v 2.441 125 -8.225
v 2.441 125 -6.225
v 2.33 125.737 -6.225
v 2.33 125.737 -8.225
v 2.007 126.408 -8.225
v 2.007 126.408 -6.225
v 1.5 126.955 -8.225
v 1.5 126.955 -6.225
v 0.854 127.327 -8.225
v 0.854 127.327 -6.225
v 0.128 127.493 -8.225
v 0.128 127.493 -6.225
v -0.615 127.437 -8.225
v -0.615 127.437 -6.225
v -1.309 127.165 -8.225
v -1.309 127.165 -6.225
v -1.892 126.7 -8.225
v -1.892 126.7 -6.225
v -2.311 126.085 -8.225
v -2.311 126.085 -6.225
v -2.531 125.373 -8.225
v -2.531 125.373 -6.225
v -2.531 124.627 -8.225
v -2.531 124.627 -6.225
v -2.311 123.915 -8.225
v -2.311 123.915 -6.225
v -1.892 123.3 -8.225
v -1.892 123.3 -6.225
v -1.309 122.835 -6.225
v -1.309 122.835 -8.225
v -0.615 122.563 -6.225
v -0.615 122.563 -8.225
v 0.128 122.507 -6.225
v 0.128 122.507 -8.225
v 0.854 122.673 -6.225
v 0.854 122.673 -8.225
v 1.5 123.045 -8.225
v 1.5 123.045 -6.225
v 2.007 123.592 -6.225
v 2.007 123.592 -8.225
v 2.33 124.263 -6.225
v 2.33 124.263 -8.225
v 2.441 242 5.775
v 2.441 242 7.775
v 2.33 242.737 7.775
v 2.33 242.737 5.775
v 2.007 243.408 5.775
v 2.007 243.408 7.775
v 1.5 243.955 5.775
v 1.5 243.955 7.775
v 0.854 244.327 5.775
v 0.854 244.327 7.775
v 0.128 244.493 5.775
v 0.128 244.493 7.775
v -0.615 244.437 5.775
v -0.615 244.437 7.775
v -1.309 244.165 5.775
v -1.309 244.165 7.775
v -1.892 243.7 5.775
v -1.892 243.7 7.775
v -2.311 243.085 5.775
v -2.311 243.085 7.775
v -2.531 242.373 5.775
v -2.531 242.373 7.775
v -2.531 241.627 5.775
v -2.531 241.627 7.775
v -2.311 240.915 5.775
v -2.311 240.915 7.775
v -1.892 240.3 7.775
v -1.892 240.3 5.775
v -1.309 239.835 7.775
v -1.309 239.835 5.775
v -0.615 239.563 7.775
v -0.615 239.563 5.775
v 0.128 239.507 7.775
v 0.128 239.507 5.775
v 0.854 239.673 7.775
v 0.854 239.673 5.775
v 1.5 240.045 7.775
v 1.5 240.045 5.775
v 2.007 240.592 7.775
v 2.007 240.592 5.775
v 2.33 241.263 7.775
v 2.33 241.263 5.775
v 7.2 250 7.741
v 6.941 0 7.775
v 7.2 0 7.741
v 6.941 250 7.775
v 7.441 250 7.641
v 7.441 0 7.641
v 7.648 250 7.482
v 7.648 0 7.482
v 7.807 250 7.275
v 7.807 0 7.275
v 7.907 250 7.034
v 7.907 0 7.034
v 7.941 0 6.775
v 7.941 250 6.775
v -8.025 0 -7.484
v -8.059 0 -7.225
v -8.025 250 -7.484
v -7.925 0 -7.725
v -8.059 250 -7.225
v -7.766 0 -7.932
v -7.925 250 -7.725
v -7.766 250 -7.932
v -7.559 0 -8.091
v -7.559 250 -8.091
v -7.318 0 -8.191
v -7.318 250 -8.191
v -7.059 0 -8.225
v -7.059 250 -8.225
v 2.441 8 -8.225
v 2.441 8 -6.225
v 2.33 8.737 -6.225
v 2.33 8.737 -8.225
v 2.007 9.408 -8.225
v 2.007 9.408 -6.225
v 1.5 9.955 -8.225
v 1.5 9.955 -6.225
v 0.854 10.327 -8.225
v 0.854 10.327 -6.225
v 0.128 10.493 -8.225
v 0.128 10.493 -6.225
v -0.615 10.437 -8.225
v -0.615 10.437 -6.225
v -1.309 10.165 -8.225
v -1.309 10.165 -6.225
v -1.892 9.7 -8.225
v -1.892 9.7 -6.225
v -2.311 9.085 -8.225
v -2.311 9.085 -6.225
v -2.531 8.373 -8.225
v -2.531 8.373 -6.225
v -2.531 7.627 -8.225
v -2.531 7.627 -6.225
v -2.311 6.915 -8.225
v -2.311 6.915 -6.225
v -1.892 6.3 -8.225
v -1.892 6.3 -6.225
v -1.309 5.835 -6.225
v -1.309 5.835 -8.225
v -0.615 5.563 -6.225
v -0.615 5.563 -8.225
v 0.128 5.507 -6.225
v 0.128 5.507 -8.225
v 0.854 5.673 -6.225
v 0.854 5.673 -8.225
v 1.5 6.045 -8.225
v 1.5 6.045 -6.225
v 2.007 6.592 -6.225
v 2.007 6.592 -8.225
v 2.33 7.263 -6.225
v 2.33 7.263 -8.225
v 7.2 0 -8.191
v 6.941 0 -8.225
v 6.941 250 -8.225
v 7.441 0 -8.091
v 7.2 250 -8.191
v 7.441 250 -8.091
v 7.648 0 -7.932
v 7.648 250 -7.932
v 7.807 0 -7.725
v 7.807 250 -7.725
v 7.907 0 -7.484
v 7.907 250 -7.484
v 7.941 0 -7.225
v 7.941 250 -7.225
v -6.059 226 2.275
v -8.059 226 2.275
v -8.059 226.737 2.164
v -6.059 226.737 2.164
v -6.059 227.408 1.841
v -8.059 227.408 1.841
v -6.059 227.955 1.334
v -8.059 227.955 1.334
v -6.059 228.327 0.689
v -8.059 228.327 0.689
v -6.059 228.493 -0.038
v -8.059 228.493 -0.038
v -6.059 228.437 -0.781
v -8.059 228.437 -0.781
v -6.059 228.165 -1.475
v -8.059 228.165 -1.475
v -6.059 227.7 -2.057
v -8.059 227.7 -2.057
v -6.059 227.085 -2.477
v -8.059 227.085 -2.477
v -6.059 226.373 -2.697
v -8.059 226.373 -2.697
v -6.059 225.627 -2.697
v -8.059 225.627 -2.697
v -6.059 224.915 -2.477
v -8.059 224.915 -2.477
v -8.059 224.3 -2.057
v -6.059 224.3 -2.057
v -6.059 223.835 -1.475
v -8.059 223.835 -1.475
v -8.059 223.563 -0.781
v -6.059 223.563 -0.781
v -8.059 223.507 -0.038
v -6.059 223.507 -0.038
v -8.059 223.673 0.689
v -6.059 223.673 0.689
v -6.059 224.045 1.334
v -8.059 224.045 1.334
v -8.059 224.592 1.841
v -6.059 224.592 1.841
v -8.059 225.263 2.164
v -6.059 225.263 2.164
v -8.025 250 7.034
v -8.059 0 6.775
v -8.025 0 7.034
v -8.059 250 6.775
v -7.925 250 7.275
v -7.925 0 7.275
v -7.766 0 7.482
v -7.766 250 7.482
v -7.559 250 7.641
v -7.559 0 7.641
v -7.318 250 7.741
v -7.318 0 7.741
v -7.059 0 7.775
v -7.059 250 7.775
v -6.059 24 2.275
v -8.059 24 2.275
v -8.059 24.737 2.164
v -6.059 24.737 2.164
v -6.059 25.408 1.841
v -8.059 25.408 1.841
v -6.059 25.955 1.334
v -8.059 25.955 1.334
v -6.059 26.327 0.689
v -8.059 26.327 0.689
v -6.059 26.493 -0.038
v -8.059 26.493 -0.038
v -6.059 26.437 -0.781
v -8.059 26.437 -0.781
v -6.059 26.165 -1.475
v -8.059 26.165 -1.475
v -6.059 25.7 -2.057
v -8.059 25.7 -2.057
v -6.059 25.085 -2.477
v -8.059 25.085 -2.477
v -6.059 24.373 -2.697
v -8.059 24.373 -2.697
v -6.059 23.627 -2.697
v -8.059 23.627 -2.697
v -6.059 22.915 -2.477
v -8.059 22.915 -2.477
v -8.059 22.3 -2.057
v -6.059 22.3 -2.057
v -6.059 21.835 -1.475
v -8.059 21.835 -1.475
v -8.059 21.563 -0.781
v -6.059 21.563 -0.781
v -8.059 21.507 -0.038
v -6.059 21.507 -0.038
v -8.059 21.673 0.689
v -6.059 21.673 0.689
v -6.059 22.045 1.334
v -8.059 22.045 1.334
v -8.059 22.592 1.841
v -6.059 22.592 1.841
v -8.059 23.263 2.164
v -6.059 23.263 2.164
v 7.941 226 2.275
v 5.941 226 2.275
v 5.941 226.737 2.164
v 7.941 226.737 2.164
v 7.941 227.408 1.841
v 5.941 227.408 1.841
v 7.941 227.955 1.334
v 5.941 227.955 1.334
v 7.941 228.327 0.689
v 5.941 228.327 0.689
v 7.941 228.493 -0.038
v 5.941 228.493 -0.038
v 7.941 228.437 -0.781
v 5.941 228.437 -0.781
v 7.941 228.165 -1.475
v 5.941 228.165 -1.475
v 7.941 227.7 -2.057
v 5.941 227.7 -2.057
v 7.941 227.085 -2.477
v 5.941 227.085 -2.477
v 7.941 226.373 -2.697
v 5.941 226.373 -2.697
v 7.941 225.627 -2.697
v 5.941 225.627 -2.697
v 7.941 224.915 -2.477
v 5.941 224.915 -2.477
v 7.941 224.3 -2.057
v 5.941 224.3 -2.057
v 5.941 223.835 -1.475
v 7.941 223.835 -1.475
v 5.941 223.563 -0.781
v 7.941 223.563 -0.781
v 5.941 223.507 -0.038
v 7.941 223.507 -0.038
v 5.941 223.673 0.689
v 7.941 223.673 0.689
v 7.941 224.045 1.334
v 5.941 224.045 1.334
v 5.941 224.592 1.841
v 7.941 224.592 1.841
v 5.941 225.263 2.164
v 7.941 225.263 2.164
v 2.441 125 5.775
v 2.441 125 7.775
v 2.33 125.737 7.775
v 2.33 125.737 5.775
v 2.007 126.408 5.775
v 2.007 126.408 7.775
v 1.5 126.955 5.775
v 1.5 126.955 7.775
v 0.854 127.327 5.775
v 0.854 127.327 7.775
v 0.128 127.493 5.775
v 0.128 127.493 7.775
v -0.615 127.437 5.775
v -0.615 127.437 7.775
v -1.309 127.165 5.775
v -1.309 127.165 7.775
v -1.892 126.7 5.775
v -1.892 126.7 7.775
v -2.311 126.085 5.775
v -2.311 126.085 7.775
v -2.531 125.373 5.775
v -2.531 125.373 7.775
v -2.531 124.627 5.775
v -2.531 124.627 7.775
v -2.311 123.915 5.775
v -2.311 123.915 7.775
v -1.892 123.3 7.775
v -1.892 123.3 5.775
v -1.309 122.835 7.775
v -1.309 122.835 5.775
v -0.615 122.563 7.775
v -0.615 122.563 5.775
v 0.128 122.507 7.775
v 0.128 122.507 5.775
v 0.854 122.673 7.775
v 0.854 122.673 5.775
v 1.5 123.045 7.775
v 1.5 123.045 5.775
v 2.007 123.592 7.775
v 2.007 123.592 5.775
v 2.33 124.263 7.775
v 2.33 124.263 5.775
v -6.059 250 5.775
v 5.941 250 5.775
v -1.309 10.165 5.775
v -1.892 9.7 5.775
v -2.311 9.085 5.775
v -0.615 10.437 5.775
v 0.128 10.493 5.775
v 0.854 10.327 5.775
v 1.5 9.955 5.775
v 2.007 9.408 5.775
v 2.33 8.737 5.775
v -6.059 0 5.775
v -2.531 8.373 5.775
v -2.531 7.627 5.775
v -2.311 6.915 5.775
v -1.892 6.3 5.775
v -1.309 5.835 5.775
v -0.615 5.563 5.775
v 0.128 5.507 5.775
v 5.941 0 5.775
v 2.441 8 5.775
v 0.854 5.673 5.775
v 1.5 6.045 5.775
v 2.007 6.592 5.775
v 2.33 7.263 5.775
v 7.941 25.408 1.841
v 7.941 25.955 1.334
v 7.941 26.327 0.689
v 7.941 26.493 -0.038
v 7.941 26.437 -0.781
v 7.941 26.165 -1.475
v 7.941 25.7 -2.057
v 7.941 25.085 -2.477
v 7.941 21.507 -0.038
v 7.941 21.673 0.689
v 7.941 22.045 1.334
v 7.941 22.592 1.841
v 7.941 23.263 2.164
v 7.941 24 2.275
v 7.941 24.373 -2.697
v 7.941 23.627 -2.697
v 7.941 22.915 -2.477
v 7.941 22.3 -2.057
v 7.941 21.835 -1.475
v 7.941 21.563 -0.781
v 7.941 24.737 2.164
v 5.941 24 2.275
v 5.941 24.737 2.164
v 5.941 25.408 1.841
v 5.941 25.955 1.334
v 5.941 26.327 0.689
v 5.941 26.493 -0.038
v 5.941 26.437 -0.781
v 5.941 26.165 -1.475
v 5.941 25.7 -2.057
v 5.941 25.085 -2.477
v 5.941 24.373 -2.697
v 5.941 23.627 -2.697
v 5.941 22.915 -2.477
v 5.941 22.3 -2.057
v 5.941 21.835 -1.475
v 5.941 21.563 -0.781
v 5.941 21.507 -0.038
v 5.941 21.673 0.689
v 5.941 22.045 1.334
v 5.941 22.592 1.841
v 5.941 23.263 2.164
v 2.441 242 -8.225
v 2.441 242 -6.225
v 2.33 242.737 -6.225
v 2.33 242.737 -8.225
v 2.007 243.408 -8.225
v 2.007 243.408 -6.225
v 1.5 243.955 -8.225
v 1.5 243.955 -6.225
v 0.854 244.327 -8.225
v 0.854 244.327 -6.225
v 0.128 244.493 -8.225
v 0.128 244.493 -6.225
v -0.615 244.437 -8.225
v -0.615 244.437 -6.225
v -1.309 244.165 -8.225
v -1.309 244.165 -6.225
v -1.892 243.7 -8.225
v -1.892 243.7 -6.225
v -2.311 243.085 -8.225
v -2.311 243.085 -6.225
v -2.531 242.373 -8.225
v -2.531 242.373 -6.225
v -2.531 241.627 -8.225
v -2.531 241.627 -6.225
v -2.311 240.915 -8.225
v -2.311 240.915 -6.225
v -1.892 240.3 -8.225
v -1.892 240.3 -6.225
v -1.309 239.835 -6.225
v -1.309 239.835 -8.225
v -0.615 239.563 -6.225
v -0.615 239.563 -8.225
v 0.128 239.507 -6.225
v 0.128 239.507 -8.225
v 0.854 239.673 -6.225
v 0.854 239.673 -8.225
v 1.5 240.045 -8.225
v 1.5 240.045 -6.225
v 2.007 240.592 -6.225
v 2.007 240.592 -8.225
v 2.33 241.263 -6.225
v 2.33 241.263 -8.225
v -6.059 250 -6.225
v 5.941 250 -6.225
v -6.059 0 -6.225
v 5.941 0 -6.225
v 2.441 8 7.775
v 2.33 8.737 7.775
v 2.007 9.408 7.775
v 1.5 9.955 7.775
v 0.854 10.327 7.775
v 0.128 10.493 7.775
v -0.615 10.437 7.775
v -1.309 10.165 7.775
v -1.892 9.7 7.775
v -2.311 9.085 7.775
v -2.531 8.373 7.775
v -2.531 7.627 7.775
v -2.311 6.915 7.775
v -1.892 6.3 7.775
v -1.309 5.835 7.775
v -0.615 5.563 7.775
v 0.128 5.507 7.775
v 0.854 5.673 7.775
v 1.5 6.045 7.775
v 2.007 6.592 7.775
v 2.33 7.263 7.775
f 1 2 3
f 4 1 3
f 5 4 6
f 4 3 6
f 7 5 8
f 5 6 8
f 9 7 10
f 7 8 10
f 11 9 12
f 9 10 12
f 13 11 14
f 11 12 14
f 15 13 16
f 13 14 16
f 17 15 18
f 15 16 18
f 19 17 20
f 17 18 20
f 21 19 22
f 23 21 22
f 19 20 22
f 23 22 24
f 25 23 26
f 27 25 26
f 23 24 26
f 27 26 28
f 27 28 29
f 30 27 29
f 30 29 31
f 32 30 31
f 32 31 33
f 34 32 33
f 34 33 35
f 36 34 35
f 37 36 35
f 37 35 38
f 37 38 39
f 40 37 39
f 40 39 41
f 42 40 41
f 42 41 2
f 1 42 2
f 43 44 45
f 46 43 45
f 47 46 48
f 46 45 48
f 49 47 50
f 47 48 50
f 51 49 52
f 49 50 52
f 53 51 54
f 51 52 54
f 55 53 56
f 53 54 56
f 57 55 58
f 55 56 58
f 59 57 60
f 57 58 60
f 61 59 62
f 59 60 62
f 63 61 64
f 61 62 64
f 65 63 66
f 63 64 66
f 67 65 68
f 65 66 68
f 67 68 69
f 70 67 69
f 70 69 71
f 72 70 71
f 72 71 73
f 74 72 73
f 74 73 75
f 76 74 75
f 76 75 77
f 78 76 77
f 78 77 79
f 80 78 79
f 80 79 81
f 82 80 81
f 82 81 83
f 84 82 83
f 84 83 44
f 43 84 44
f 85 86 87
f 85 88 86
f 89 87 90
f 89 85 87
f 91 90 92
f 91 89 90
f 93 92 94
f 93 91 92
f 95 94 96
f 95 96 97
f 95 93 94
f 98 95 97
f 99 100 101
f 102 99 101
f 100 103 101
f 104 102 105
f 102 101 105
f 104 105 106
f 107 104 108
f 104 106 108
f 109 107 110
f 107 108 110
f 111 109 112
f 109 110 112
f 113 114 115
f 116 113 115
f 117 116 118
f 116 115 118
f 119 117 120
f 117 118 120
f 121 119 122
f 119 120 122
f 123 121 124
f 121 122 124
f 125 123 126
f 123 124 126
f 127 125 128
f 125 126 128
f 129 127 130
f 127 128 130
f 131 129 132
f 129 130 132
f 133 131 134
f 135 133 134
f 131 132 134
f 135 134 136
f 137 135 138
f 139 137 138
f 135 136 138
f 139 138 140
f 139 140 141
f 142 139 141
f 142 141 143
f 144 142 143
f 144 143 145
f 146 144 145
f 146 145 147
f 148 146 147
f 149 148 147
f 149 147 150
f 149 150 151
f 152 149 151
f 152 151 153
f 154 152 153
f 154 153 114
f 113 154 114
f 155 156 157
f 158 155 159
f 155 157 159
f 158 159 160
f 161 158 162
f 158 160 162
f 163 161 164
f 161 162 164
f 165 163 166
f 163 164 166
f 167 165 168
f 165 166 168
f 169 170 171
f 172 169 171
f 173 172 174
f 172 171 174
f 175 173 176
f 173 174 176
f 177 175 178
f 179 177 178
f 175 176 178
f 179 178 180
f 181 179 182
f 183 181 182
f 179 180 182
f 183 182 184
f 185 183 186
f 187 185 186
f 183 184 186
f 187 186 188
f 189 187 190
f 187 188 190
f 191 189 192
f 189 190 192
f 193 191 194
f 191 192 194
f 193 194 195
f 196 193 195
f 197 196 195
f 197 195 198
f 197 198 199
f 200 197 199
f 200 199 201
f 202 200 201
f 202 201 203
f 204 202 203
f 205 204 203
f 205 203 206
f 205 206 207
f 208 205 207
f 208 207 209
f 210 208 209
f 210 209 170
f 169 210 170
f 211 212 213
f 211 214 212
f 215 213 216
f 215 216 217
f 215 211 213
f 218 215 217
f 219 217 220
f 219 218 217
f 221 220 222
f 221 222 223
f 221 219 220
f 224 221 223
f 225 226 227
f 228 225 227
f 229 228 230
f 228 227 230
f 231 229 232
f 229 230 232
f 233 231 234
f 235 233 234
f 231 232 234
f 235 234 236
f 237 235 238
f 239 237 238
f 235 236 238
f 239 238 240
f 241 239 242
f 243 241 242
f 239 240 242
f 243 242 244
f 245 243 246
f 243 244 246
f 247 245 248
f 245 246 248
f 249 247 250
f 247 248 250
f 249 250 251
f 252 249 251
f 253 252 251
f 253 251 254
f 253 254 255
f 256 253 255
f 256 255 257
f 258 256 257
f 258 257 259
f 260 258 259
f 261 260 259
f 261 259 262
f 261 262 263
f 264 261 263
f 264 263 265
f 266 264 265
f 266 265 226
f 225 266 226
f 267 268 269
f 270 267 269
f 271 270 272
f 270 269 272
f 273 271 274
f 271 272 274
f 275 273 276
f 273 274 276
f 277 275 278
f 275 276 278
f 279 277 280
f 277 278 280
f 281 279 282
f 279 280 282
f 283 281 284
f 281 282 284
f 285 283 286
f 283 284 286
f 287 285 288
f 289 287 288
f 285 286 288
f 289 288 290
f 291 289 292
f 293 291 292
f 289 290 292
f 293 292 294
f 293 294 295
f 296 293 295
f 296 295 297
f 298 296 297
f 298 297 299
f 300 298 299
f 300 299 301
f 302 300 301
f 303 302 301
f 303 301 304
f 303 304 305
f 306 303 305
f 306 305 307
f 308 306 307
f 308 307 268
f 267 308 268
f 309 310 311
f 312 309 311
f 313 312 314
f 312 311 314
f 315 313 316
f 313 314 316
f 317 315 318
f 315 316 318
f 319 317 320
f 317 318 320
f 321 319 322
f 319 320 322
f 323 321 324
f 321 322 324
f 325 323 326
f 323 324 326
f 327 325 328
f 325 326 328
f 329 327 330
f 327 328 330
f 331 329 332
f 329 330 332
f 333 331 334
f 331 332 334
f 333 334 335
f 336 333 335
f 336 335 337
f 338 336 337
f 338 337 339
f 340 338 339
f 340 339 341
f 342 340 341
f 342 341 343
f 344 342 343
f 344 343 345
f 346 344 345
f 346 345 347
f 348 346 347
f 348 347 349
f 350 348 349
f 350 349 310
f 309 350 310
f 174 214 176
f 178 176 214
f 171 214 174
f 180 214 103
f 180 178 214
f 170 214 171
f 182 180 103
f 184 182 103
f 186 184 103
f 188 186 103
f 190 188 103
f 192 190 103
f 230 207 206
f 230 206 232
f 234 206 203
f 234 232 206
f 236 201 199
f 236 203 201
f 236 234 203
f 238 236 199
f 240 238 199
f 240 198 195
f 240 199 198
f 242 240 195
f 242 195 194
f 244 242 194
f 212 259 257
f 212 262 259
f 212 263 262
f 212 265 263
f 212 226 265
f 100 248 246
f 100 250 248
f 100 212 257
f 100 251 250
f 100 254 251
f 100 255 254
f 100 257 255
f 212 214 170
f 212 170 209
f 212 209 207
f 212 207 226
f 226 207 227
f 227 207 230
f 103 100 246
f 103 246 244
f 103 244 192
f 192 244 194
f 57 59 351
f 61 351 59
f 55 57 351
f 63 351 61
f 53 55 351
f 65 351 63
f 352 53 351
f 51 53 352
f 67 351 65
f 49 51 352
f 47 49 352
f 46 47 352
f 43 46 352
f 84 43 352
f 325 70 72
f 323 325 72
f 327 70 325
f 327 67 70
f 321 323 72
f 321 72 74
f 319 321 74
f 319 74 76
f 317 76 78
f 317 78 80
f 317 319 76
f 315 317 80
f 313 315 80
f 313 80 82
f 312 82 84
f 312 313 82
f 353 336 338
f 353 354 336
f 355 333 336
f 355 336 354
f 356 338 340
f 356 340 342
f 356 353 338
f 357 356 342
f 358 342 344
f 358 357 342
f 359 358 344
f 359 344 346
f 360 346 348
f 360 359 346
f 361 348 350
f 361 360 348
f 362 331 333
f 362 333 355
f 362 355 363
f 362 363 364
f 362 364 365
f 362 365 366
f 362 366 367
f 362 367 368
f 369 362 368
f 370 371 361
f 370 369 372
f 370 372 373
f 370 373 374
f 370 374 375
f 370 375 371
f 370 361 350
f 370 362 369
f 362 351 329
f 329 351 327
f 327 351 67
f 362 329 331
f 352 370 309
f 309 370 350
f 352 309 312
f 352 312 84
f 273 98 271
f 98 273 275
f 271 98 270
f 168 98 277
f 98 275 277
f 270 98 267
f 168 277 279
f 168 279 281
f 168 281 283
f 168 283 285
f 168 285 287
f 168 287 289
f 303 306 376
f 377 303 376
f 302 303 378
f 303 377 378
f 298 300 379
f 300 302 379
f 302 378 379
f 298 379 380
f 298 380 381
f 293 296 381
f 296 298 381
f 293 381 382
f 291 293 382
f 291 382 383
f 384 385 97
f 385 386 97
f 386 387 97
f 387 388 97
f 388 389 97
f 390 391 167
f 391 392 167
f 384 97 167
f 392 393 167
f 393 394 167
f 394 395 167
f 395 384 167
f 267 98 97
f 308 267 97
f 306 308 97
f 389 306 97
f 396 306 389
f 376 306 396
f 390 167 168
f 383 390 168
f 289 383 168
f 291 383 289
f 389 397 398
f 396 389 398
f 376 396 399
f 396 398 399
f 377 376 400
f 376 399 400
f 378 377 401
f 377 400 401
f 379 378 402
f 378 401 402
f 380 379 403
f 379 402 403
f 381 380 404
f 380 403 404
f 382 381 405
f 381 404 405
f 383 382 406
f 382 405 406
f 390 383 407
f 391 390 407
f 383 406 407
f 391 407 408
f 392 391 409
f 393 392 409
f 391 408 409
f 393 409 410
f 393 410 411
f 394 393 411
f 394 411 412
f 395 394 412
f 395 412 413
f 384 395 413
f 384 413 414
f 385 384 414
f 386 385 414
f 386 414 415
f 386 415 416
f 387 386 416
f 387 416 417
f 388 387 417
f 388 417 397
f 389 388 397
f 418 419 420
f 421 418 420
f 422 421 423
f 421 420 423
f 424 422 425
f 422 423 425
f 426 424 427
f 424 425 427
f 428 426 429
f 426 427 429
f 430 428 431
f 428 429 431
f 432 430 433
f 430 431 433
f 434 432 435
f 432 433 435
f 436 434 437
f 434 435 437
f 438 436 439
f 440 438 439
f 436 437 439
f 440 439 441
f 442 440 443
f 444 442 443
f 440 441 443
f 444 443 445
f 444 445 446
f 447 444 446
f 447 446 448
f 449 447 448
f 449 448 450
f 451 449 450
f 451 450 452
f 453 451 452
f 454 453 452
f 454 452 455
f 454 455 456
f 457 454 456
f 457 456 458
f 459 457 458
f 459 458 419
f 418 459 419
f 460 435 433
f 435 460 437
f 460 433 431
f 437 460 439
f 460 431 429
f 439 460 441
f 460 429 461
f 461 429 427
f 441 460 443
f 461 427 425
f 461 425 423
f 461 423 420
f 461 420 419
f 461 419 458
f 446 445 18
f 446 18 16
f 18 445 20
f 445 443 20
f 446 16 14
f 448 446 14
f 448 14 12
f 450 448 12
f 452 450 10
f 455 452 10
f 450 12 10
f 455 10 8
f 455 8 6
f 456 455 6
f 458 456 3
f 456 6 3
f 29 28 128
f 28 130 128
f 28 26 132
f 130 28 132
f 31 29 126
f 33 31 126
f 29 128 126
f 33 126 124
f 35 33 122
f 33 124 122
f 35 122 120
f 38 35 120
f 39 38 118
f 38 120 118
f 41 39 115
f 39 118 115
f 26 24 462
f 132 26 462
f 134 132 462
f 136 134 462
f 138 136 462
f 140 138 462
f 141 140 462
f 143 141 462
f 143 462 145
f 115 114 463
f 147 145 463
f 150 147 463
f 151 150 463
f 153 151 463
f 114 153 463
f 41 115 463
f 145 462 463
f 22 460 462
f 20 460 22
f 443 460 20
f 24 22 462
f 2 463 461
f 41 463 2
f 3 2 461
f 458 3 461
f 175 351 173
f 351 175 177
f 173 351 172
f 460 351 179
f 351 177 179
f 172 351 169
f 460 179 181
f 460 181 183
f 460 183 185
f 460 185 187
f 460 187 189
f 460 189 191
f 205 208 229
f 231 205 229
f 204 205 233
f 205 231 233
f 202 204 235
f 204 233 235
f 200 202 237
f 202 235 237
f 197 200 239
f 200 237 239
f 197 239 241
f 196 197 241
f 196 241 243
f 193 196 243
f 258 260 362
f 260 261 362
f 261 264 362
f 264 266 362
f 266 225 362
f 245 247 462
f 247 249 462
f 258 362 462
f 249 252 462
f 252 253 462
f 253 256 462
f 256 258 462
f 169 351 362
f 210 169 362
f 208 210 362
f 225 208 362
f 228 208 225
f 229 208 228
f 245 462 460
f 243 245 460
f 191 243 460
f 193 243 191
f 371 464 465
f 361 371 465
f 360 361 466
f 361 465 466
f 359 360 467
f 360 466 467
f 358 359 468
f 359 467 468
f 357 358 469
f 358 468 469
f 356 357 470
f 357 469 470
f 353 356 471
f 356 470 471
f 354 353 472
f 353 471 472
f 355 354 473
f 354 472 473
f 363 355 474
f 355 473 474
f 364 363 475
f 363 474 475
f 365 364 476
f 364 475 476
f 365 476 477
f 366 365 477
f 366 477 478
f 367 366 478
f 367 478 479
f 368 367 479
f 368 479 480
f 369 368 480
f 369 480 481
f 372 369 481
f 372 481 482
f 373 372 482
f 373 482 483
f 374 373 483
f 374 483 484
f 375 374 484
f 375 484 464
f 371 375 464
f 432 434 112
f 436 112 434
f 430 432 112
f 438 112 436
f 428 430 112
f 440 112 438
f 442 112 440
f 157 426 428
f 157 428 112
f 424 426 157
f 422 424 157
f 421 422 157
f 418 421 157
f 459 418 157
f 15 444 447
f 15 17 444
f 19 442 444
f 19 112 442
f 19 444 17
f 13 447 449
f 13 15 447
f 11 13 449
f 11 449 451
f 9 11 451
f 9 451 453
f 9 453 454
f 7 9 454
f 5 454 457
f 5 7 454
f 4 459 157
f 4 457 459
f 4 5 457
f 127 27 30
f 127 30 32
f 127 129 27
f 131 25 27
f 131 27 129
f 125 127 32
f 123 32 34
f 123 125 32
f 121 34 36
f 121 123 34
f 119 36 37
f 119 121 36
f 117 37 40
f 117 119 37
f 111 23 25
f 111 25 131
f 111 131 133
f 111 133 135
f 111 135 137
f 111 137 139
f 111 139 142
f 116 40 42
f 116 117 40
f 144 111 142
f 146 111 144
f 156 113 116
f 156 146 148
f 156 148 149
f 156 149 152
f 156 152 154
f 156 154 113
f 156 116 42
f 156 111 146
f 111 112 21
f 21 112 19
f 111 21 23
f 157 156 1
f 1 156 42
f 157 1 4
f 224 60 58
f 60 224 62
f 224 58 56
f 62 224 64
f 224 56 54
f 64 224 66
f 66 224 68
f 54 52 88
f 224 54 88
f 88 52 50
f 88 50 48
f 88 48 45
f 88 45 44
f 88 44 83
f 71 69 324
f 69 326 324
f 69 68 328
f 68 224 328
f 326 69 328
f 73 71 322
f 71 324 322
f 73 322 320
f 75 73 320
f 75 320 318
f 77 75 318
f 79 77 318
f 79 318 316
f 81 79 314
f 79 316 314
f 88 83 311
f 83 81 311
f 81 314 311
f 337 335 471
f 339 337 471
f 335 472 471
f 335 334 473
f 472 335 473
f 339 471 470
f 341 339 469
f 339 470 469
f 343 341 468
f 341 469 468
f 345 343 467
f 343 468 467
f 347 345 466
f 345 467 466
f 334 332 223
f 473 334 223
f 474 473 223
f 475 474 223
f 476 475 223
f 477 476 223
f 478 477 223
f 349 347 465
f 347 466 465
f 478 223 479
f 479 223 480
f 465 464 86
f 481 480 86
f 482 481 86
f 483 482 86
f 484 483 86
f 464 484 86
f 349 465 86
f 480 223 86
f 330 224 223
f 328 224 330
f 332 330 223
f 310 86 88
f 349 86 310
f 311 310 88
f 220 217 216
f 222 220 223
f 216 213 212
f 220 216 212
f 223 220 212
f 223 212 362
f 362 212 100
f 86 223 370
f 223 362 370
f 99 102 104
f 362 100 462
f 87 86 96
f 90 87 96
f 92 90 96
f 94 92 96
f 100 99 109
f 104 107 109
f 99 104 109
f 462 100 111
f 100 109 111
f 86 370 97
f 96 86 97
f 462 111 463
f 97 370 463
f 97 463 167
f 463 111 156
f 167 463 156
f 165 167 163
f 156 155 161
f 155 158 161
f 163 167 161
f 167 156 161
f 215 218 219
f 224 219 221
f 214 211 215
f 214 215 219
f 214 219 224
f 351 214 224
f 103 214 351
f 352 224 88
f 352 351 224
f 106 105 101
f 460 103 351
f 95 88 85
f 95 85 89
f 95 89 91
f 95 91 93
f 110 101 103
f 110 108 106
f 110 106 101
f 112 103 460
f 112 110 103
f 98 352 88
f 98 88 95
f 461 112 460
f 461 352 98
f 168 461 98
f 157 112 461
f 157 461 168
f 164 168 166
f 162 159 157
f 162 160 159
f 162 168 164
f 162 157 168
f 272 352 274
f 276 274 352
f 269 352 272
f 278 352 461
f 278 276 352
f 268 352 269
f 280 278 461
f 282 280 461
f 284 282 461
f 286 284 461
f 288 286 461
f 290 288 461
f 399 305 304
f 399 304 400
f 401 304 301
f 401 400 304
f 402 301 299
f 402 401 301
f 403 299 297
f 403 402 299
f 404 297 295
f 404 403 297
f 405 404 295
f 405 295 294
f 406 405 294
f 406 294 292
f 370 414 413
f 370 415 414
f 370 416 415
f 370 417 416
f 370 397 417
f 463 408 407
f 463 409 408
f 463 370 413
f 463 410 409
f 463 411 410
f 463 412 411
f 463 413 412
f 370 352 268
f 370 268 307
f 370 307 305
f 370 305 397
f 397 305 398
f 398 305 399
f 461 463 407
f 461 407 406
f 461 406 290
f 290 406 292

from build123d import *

# Parameters (mm, degrees)
SKETCH1_W           = 16
SKETCH1_H           = 16
SKETCH1_W_2         = 12
SKETCH1_H_2         = 12
BOSS_EXTRUDE1_DEPTH = 250
FILLET1_R           = 1
SKETCH2_R           = 2.5
CUT_EXTRUDE1_DEPTH  = 16
SKETCH3_R           = 2.5
CUT_EXTRUDE2_DEPTH  = 16
SKETCH4_R           = 2.5
CUT_EXTRUDE3_DEPTH  = 16
SKETCH5_R           = 2.5
CUT_EXTRUDE4_DEPTH  = 16


with BuildPart() as part:
    # Sketch1 → Boss-Extrude1 (new body)
    with BuildSketch(Plane(origin=(0, 0, 0), x_dir=(1, 0, 0), z_dir=(0, 1, 0))):
        with Locations((-0.059056614, 0.224719101)):
            Rectangle(SKETCH1_W, SKETCH1_H)
        with Locations((-0.059056614, 0.224719101)):
            Rectangle(SKETCH1_W_2, SKETCH1_H_2, mode=Mode.SUBTRACT)
    extrude(amount=BOSS_EXTRUDE1_DEPTH)

    # Fillet1
    fillet1_edges = [part.edges().sort_by_distance(p)[0] for p in [
        (-8.059056614, 125, -8.224719101),
        (7.940943386, 125, -8.224719101),
        (7.940943386, 125, 7.775280899),
        (-8.059056614, 125, 7.775280899),
    ]]
    fillet(fillet1_edges, radius=FILLET1_R)

    # Sketch2 → Cut-Extrude1 (cut)
    with BuildSketch(Plane.XY.offset(7.775280899)):
        with Locations((-0.059056614, 8)):
            Circle(SKETCH2_R)
    extrude(amount=-CUT_EXTRUDE1_DEPTH, mode=Mode.SUBTRACT)

    # Sketch3 → Cut-Extrude2 (cut)
    with BuildSketch(Plane.XY.offset(7.775280899)):
        with Locations((-0.059056614, 242)):
            Circle(SKETCH3_R)
    extrude(amount=-CUT_EXTRUDE2_DEPTH, mode=Mode.SUBTRACT)

    # Sketch4 → Cut-Extrude3 (cut)
    with BuildSketch(Plane.ZY.offset(8.059056614)):
        with Locations((-0.224719101, 24)):
            Circle(SKETCH4_R)
        with Locations((-0.224719101, 226)):
            Circle(SKETCH4_R)
    extrude(amount=-CUT_EXTRUDE3_DEPTH, mode=Mode.SUBTRACT)

    # Sketch5 → Cut-Extrude4 (cut)
    with BuildSketch(Plane.XY.offset(7.775280899)):
        with Locations((-0.059056614, 125)):
            Circle(SKETCH5_R)
    extrude(amount=-CUT_EXTRUDE4_DEPTH, mode=Mode.SUBTRACT)


solid = part.part
